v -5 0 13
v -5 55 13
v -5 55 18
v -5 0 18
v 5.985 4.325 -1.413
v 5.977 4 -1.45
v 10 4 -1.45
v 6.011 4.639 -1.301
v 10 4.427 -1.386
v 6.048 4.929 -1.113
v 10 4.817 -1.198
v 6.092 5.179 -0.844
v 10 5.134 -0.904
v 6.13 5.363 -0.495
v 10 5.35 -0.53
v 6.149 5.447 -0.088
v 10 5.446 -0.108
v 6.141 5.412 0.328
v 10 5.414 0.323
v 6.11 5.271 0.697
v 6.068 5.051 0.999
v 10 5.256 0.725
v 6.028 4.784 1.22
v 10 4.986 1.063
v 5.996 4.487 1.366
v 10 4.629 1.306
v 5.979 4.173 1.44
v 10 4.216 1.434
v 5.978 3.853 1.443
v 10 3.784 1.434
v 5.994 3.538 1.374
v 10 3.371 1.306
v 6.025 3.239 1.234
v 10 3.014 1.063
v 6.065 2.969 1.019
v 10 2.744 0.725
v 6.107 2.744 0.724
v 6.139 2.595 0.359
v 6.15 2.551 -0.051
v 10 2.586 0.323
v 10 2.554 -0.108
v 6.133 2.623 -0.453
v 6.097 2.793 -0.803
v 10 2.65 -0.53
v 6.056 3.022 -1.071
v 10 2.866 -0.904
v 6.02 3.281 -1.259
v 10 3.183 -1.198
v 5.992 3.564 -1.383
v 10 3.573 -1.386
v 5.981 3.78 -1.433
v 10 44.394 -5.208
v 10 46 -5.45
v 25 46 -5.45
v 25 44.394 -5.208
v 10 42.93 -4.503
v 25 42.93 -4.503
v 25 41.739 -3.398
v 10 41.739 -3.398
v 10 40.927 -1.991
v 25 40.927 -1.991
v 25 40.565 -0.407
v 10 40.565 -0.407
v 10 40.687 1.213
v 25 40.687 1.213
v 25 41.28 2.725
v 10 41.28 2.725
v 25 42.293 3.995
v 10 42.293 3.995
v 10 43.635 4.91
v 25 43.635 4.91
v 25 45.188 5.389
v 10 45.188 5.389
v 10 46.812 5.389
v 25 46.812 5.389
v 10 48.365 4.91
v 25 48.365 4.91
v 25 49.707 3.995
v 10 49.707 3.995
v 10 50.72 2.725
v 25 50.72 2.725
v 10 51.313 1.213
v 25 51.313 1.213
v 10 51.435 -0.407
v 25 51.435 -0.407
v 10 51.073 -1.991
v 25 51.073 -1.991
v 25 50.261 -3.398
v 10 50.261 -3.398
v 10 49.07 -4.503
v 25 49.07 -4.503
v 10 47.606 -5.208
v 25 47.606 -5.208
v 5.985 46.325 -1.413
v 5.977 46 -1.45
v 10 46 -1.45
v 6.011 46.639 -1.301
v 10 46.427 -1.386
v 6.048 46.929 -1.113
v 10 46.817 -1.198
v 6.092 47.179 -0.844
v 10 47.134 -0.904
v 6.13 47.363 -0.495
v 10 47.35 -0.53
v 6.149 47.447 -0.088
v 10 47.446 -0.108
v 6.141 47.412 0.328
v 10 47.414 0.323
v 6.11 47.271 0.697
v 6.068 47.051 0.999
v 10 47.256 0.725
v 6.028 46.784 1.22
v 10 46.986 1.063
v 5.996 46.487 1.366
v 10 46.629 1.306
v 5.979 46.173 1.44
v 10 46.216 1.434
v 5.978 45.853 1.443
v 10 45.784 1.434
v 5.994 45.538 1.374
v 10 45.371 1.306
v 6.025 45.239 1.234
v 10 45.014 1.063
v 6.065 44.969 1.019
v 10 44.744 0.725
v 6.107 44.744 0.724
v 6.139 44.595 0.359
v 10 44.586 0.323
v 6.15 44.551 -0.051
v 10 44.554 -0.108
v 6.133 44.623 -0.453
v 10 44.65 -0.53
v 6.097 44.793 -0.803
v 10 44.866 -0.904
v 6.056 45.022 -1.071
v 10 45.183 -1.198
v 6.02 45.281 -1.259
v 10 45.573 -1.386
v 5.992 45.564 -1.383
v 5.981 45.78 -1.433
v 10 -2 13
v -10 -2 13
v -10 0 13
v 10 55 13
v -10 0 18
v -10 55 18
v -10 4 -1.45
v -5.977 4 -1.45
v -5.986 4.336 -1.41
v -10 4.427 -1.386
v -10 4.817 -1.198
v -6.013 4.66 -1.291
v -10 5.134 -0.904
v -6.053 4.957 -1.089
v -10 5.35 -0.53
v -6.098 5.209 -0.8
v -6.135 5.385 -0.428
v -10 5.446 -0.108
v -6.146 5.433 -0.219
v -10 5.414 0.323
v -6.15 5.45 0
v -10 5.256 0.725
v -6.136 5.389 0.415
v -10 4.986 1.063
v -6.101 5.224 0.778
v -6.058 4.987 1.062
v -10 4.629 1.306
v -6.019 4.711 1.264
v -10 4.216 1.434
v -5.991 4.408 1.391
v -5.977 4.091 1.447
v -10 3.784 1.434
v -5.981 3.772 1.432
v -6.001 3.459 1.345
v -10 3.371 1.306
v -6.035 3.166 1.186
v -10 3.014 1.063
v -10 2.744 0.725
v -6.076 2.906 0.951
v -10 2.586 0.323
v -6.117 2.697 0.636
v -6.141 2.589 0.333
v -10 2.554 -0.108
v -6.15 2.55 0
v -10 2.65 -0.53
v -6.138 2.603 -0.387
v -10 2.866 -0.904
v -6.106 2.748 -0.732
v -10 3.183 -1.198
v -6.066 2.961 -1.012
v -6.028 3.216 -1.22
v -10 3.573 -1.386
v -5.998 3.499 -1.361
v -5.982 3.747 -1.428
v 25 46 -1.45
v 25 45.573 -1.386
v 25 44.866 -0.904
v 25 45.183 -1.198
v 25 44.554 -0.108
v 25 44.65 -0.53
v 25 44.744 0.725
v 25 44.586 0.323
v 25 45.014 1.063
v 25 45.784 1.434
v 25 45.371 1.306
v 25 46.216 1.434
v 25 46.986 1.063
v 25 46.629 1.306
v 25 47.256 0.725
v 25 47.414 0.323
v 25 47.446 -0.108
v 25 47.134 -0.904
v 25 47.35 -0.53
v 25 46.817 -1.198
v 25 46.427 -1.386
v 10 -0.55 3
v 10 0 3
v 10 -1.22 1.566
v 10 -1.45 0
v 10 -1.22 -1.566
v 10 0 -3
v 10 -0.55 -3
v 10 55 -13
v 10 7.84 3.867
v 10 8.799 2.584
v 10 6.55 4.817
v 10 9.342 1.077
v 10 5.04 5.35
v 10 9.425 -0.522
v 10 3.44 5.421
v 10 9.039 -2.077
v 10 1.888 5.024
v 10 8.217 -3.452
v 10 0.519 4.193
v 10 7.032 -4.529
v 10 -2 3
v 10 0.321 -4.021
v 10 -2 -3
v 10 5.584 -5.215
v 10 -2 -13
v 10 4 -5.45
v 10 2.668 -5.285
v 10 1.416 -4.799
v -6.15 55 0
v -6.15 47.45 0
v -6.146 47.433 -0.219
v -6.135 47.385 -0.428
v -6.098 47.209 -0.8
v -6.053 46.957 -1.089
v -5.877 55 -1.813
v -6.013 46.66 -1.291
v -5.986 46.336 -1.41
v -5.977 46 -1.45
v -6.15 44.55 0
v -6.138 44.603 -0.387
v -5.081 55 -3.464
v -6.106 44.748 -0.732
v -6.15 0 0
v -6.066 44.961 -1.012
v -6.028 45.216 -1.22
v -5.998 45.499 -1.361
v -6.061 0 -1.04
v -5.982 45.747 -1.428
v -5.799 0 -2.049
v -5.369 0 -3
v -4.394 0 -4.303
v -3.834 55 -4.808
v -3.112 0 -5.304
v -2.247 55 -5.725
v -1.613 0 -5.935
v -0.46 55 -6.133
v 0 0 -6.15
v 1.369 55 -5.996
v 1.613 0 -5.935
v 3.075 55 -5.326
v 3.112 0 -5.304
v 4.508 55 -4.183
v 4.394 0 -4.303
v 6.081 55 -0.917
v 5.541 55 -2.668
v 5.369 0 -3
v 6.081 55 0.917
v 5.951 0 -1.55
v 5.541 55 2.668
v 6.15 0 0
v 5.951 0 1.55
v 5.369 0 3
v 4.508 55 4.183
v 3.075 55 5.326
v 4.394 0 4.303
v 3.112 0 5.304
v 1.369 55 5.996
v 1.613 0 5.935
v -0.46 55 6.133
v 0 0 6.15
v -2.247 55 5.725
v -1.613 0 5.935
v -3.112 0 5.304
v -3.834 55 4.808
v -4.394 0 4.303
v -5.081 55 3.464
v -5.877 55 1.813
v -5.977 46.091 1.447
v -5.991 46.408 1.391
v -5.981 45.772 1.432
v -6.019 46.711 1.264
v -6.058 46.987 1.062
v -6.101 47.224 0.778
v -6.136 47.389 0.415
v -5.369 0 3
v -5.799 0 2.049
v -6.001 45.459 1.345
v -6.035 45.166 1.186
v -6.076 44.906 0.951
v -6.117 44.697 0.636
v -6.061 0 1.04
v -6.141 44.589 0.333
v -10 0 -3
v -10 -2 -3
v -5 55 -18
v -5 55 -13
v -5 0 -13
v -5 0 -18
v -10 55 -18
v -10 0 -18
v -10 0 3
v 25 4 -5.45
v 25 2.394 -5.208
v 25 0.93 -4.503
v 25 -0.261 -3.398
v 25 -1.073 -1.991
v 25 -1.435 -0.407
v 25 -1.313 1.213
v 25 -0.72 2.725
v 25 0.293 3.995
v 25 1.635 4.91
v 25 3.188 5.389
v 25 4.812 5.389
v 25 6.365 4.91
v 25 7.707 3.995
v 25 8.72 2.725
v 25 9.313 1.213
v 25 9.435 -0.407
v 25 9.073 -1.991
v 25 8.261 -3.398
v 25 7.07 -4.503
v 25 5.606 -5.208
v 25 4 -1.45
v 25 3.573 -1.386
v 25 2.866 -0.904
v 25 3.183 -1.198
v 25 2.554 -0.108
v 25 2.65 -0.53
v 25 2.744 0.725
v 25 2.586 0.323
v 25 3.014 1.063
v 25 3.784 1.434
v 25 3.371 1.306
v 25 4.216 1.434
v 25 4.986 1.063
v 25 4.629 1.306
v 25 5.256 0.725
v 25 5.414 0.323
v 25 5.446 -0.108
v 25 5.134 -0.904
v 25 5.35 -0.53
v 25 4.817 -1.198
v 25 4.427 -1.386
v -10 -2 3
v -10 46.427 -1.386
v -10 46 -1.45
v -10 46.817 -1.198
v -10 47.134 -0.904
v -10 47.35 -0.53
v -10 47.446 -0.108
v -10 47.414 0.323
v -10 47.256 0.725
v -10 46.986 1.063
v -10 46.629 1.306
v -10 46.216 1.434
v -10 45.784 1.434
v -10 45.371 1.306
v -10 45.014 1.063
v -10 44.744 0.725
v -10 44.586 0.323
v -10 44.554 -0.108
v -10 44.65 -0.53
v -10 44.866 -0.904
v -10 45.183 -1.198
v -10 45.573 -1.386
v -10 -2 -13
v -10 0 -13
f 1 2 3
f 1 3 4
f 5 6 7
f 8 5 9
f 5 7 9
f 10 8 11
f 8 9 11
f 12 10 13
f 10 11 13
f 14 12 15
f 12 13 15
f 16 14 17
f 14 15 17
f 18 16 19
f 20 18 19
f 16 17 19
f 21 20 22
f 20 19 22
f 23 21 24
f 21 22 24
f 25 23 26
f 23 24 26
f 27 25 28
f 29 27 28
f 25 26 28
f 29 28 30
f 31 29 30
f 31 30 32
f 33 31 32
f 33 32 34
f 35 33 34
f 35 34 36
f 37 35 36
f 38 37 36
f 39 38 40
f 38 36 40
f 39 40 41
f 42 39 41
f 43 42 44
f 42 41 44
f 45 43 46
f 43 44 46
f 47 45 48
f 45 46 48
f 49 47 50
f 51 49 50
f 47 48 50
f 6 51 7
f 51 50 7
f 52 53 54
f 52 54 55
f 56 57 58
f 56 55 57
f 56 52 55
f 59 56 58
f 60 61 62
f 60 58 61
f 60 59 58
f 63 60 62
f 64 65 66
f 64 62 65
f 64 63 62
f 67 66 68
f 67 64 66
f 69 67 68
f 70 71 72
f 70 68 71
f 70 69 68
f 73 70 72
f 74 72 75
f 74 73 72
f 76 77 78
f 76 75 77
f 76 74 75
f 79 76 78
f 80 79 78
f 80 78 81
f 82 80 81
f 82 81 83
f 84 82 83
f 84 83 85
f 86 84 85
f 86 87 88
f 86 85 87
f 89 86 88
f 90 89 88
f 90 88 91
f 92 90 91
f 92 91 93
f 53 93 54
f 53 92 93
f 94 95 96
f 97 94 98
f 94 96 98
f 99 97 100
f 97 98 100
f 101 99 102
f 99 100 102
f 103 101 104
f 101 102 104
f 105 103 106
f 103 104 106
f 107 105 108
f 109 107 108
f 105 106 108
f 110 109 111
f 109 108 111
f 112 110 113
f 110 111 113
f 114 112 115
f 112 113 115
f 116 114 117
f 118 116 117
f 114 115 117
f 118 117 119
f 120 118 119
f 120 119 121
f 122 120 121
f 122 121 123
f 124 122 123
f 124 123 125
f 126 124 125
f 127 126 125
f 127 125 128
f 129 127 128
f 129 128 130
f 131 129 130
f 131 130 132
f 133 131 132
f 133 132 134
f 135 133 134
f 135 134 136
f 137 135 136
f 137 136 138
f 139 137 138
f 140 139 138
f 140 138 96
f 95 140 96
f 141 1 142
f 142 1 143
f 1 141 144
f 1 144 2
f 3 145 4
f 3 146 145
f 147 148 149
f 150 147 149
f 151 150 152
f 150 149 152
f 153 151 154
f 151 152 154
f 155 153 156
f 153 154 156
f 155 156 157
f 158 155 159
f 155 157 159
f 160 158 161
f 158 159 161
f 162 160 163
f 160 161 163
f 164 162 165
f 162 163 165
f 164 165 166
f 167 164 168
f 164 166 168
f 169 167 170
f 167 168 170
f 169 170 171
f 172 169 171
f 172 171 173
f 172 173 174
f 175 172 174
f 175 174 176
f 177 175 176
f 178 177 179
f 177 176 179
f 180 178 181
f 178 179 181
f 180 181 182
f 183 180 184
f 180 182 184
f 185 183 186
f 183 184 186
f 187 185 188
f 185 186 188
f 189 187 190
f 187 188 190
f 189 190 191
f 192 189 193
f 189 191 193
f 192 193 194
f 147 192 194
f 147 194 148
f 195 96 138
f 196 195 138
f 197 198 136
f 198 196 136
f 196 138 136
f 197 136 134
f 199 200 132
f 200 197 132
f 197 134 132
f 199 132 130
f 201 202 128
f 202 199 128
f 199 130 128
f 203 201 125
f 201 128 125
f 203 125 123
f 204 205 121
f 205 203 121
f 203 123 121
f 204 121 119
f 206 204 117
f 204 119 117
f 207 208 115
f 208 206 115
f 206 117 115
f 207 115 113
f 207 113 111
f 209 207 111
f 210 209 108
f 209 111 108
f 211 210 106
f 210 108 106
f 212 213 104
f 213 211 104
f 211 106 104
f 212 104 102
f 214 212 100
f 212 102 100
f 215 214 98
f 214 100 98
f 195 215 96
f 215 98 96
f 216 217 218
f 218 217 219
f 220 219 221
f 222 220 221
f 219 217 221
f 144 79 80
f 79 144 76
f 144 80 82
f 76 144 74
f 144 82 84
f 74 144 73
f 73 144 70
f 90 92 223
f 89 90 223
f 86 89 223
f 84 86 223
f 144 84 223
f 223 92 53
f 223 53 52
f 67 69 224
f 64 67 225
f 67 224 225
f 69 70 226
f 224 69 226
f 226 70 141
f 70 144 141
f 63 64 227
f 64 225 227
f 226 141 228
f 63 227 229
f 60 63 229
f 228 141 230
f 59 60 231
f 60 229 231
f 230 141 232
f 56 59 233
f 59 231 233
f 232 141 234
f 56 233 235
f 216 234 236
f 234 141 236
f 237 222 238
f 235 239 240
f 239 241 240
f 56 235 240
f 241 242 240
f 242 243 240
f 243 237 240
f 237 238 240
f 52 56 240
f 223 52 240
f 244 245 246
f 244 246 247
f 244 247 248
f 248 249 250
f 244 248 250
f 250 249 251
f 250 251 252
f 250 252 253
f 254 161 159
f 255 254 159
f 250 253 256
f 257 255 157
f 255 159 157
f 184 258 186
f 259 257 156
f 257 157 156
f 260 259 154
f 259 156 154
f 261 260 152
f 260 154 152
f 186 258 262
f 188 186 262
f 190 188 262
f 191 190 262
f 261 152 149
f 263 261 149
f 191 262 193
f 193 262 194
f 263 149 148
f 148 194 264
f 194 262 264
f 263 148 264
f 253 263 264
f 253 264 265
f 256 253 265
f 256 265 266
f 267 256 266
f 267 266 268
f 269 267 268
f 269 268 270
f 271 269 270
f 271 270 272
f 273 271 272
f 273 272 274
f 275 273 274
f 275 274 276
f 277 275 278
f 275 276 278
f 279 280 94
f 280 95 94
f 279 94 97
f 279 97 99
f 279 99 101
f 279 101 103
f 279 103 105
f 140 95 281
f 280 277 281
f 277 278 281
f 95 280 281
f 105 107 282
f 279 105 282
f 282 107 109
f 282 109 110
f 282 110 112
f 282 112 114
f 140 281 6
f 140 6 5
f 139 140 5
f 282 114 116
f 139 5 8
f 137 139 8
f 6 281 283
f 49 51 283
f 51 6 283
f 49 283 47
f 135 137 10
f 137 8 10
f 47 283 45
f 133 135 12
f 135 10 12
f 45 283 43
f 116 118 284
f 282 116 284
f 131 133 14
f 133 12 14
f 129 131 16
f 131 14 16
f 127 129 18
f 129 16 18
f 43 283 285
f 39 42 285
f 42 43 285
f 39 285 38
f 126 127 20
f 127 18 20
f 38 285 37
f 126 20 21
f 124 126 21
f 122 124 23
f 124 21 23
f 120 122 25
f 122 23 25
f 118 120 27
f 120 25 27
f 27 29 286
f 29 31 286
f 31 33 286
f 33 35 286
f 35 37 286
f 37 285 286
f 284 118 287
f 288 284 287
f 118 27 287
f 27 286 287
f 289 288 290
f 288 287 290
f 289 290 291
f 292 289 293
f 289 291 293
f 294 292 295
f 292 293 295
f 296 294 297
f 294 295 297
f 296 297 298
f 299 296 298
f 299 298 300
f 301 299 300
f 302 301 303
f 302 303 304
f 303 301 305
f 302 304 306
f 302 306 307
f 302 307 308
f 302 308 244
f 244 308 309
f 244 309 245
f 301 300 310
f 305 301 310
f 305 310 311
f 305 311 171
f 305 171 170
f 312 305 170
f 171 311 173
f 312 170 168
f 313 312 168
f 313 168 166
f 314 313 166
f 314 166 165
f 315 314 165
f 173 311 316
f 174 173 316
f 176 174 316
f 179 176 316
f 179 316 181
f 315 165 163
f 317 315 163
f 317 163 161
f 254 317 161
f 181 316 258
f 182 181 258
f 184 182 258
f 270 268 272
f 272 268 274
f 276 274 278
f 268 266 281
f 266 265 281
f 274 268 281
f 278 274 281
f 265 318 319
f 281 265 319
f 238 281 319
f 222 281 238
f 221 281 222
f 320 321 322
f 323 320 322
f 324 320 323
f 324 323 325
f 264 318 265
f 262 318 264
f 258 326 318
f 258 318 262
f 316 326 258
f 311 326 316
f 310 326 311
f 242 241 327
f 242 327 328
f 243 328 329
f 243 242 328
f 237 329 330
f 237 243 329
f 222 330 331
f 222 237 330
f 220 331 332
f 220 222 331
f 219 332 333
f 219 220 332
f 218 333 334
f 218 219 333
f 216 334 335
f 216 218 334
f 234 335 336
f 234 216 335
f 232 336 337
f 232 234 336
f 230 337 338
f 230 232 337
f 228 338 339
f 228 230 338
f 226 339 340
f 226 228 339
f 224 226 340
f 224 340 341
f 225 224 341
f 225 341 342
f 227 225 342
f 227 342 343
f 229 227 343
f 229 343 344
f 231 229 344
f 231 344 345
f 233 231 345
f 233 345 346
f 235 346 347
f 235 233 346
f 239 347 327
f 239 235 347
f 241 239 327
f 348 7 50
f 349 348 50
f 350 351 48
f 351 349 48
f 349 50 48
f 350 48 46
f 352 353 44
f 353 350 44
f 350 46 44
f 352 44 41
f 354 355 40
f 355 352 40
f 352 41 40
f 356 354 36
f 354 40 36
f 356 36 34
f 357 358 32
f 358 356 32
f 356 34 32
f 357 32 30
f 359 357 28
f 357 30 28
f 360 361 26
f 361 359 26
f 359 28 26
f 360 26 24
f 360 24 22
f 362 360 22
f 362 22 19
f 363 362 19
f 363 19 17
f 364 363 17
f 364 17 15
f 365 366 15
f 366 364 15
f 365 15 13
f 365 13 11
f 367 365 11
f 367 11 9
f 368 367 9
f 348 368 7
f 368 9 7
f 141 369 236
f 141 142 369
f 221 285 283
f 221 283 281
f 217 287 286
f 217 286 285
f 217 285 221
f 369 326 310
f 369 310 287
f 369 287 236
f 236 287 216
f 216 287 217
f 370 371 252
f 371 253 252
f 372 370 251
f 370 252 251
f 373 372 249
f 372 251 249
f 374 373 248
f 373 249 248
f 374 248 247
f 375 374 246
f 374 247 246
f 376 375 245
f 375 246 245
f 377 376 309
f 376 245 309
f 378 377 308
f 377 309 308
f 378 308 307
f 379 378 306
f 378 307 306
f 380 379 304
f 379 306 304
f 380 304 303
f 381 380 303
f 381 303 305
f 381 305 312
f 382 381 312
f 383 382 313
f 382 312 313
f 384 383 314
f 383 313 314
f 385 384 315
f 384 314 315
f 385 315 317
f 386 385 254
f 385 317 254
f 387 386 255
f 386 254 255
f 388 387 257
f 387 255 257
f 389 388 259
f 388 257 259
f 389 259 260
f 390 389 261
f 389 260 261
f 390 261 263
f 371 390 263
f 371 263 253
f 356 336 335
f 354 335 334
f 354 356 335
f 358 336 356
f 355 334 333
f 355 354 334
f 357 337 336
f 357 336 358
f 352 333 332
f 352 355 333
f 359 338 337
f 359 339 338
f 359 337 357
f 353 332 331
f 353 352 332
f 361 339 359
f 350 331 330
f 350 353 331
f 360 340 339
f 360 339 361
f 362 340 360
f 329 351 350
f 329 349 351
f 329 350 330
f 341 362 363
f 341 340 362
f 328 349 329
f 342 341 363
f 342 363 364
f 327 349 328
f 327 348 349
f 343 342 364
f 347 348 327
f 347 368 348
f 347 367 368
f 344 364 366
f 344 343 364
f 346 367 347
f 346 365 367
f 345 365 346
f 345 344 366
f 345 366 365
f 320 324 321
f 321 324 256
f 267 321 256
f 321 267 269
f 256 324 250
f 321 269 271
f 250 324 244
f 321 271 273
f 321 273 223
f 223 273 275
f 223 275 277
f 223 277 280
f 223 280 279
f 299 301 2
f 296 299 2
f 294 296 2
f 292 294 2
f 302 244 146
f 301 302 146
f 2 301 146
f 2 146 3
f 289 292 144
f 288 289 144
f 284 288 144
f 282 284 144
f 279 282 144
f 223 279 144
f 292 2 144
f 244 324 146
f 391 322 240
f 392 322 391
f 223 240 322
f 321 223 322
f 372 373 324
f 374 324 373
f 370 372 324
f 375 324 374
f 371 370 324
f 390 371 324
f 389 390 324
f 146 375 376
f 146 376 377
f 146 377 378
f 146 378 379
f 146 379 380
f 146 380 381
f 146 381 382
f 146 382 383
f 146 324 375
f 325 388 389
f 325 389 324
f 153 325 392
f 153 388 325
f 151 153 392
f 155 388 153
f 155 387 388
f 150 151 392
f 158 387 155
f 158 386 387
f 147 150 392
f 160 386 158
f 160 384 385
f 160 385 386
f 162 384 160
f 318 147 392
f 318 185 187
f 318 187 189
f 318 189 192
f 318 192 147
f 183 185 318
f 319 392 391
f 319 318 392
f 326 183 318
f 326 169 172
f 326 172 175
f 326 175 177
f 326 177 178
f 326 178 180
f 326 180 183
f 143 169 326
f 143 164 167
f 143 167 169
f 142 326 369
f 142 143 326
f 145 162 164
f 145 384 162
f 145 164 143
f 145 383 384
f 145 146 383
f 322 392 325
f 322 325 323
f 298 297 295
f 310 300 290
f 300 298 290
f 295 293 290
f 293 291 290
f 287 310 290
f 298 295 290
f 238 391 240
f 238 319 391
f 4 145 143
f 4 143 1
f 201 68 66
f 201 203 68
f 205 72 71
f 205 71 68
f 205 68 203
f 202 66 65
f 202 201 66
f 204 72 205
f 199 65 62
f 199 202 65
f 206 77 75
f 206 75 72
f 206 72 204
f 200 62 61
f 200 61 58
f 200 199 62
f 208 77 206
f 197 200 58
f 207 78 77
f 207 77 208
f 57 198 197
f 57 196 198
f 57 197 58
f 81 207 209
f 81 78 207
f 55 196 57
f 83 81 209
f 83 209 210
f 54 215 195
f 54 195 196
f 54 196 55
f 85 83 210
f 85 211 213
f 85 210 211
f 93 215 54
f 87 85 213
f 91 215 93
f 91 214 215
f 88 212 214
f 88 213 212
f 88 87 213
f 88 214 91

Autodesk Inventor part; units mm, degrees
ref_plane "YZ Plane" through (0, 0, 0) normal (1, 0, 0) x (0, 1, 0)
ref_plane "XZ Plane" through (0, 0, 0) normal (0, 1, 0) x (-1, 0, 0)
ref_plane "XY Plane" through (0, 0, 0) normal (0, 0, 1) x (1, 0, 0)
sketch "Sketch1" plane through (0, 0, 0) normal (0, 1, 0) x (-1, 0, 0)
  circle A0 centre (0, 0) radius 6.15
  line L0 (10, 13) -> (-10, 13)
  line L1 (-10, 13) -> (-10, -13)
  line L2 (-10, -13) -> (10, -13)
  line L3 (10, -13) -> (10, 13)
  dimension "d0" = 12.3
  dimension "d1" = 10
  dimension "d2" = 10
  dimension "d3" = 13
  dimension "d4" = 13
extrude "Extrusion1" add sketch "Sketch1" along normal blind 55
sketch "Sketch2" plane through (10, 0, 13) normal (1, 0, 0) x (0, 0, -1)
  circle A0 centre (13, 4) radius 1.45
  line L0 (0, 0) -> (26, 0) projected
  circle A1 centre (13, 46) radius 1.45
  line L1 (0, 0) -> (0, 55) projected
  point P0 (13, 0)
  dimension "d7" = 2.9
  dimension "d8" = 4
  dimension "d9" = 2.9
  dimension "d10" = 46
  dimension "d11" = 13
  dimension "d12" = 13
extrude "Extrusion2" cut sketch "Sketch2" against normal blind 55
sketch "Sketch3" plane through (10, 0, 13) normal (1, 0, 0) x (0, 0, -1)
  circle A0 centre (13, 4) radius 1.45 projected
  circle A1 centre (13, 46) radius 1.45 projected
  line L0 (0, 0) -> (26, 0) projected
  line L1 (26, 0) -> (26, 55) projected
  line L2 (0, 55) -> (26, 55) projected
  line L3 (0, 0) -> (0, 55) projected
  circle A2 centre (13, 46) radius 5.45
  circle A3 centre (13, 4) radius 5.45
  circle A4 centre (4, 46) radius 1.6
  circle A5 centre (22, 46) radius 1.6
  circle A6 centre (4, 4) radius 1.6
  circle A7 centre (22, 4) radius 1.6
  point P0 (13, 0)
  dimension "d15" = 4
  dimension "d16" = 4
  dimension "d19" = 3.2
  dimension "d20" = 3.2
  dimension "d21" = 3.2
  dimension "d22" = 3.2
  dimension "d23" = 4
  dimension "d24" = 4
  dimension "d25" = 4
  dimension "d26" = 4
extrude "Extrusion3" add sketch "Sketch3" along normal blind 15 contours A3 L0 | L0 A3 | A2
sketch "Sketch6" plane through (-10, 0, 13) normal (0, 0, 1) x (1, 0, 0)
  line L0 (20, 55) -> (0, 55) projected
  line L1 (20, 0) -> (0, 0) projected
  line L2 (0, 55) -> (5, 55)
  line L3 (5, 55) -> (5, 0)
  line L4 (5, 0) -> (0, 0)
  line L5 (0, 0) -> (0, 55)
  point P0 (10, 0)
  point P1 (5, 55)
  dimension "d31" = 5
extrude "Extrusion6" add sketch "Sketch6" along normal blind 5
sketch "Sketch7" plane through (10, 0, -13) normal (0, 0, -1) x (-1, 0, 0)
  line L0 (20, 55) -> (20, 0) projected
  line L1 (20, 0) -> (15, 0) projected
  line L2 (20, 55) -> (15, 55)
  line L3 (15, 55) -> (15, 0)
  line L4 (15, 0) -> (20, 0)
  line L5 (20, 0) -> (20, 55)
  point P0 (10, 0)
  dimension "d34" = 5
extrude "Extrusion7" add sketch "Sketch7" along normal blind 5
sketch "Sketch8" plane through (0, 0, 0) normal (0, -1, 0) x (1, 0, 0)
  line L0 (10, 13) -> (10, -13) projected
  line L1 (-10, 18) -> (-10, -18) projected
  line L2 (10, 13) -> (-10, 13)
  line L3 (-10, 13) -> (-10, 3)
  line L4 (-10, 3) -> (10, 3)
  line L5 (10, 3) -> (10, 13)
  line L6 (10, -13) -> (-5, -13) projected
  line L7 (10, -13) -> (-10, -13)
  line L8 (-10, -13) -> (-10, -3)
  line L9 (-10, -3) -> (10, -3)
  line L10 (10, -3) -> (10, -13)
  point P0 (0, 0)
  point P1 (10, -3)
  point P2 (-10, -3)
  dimension "d37" = 10
  dimension "d38" = 10
extrude "Extrusion8" add sketch "Sketch8" along normal blind 2 contours L0 L4 L1 L2 | L0 L6 L7 L1 L9
properties part number "Tube_outerhole_template_p1"
